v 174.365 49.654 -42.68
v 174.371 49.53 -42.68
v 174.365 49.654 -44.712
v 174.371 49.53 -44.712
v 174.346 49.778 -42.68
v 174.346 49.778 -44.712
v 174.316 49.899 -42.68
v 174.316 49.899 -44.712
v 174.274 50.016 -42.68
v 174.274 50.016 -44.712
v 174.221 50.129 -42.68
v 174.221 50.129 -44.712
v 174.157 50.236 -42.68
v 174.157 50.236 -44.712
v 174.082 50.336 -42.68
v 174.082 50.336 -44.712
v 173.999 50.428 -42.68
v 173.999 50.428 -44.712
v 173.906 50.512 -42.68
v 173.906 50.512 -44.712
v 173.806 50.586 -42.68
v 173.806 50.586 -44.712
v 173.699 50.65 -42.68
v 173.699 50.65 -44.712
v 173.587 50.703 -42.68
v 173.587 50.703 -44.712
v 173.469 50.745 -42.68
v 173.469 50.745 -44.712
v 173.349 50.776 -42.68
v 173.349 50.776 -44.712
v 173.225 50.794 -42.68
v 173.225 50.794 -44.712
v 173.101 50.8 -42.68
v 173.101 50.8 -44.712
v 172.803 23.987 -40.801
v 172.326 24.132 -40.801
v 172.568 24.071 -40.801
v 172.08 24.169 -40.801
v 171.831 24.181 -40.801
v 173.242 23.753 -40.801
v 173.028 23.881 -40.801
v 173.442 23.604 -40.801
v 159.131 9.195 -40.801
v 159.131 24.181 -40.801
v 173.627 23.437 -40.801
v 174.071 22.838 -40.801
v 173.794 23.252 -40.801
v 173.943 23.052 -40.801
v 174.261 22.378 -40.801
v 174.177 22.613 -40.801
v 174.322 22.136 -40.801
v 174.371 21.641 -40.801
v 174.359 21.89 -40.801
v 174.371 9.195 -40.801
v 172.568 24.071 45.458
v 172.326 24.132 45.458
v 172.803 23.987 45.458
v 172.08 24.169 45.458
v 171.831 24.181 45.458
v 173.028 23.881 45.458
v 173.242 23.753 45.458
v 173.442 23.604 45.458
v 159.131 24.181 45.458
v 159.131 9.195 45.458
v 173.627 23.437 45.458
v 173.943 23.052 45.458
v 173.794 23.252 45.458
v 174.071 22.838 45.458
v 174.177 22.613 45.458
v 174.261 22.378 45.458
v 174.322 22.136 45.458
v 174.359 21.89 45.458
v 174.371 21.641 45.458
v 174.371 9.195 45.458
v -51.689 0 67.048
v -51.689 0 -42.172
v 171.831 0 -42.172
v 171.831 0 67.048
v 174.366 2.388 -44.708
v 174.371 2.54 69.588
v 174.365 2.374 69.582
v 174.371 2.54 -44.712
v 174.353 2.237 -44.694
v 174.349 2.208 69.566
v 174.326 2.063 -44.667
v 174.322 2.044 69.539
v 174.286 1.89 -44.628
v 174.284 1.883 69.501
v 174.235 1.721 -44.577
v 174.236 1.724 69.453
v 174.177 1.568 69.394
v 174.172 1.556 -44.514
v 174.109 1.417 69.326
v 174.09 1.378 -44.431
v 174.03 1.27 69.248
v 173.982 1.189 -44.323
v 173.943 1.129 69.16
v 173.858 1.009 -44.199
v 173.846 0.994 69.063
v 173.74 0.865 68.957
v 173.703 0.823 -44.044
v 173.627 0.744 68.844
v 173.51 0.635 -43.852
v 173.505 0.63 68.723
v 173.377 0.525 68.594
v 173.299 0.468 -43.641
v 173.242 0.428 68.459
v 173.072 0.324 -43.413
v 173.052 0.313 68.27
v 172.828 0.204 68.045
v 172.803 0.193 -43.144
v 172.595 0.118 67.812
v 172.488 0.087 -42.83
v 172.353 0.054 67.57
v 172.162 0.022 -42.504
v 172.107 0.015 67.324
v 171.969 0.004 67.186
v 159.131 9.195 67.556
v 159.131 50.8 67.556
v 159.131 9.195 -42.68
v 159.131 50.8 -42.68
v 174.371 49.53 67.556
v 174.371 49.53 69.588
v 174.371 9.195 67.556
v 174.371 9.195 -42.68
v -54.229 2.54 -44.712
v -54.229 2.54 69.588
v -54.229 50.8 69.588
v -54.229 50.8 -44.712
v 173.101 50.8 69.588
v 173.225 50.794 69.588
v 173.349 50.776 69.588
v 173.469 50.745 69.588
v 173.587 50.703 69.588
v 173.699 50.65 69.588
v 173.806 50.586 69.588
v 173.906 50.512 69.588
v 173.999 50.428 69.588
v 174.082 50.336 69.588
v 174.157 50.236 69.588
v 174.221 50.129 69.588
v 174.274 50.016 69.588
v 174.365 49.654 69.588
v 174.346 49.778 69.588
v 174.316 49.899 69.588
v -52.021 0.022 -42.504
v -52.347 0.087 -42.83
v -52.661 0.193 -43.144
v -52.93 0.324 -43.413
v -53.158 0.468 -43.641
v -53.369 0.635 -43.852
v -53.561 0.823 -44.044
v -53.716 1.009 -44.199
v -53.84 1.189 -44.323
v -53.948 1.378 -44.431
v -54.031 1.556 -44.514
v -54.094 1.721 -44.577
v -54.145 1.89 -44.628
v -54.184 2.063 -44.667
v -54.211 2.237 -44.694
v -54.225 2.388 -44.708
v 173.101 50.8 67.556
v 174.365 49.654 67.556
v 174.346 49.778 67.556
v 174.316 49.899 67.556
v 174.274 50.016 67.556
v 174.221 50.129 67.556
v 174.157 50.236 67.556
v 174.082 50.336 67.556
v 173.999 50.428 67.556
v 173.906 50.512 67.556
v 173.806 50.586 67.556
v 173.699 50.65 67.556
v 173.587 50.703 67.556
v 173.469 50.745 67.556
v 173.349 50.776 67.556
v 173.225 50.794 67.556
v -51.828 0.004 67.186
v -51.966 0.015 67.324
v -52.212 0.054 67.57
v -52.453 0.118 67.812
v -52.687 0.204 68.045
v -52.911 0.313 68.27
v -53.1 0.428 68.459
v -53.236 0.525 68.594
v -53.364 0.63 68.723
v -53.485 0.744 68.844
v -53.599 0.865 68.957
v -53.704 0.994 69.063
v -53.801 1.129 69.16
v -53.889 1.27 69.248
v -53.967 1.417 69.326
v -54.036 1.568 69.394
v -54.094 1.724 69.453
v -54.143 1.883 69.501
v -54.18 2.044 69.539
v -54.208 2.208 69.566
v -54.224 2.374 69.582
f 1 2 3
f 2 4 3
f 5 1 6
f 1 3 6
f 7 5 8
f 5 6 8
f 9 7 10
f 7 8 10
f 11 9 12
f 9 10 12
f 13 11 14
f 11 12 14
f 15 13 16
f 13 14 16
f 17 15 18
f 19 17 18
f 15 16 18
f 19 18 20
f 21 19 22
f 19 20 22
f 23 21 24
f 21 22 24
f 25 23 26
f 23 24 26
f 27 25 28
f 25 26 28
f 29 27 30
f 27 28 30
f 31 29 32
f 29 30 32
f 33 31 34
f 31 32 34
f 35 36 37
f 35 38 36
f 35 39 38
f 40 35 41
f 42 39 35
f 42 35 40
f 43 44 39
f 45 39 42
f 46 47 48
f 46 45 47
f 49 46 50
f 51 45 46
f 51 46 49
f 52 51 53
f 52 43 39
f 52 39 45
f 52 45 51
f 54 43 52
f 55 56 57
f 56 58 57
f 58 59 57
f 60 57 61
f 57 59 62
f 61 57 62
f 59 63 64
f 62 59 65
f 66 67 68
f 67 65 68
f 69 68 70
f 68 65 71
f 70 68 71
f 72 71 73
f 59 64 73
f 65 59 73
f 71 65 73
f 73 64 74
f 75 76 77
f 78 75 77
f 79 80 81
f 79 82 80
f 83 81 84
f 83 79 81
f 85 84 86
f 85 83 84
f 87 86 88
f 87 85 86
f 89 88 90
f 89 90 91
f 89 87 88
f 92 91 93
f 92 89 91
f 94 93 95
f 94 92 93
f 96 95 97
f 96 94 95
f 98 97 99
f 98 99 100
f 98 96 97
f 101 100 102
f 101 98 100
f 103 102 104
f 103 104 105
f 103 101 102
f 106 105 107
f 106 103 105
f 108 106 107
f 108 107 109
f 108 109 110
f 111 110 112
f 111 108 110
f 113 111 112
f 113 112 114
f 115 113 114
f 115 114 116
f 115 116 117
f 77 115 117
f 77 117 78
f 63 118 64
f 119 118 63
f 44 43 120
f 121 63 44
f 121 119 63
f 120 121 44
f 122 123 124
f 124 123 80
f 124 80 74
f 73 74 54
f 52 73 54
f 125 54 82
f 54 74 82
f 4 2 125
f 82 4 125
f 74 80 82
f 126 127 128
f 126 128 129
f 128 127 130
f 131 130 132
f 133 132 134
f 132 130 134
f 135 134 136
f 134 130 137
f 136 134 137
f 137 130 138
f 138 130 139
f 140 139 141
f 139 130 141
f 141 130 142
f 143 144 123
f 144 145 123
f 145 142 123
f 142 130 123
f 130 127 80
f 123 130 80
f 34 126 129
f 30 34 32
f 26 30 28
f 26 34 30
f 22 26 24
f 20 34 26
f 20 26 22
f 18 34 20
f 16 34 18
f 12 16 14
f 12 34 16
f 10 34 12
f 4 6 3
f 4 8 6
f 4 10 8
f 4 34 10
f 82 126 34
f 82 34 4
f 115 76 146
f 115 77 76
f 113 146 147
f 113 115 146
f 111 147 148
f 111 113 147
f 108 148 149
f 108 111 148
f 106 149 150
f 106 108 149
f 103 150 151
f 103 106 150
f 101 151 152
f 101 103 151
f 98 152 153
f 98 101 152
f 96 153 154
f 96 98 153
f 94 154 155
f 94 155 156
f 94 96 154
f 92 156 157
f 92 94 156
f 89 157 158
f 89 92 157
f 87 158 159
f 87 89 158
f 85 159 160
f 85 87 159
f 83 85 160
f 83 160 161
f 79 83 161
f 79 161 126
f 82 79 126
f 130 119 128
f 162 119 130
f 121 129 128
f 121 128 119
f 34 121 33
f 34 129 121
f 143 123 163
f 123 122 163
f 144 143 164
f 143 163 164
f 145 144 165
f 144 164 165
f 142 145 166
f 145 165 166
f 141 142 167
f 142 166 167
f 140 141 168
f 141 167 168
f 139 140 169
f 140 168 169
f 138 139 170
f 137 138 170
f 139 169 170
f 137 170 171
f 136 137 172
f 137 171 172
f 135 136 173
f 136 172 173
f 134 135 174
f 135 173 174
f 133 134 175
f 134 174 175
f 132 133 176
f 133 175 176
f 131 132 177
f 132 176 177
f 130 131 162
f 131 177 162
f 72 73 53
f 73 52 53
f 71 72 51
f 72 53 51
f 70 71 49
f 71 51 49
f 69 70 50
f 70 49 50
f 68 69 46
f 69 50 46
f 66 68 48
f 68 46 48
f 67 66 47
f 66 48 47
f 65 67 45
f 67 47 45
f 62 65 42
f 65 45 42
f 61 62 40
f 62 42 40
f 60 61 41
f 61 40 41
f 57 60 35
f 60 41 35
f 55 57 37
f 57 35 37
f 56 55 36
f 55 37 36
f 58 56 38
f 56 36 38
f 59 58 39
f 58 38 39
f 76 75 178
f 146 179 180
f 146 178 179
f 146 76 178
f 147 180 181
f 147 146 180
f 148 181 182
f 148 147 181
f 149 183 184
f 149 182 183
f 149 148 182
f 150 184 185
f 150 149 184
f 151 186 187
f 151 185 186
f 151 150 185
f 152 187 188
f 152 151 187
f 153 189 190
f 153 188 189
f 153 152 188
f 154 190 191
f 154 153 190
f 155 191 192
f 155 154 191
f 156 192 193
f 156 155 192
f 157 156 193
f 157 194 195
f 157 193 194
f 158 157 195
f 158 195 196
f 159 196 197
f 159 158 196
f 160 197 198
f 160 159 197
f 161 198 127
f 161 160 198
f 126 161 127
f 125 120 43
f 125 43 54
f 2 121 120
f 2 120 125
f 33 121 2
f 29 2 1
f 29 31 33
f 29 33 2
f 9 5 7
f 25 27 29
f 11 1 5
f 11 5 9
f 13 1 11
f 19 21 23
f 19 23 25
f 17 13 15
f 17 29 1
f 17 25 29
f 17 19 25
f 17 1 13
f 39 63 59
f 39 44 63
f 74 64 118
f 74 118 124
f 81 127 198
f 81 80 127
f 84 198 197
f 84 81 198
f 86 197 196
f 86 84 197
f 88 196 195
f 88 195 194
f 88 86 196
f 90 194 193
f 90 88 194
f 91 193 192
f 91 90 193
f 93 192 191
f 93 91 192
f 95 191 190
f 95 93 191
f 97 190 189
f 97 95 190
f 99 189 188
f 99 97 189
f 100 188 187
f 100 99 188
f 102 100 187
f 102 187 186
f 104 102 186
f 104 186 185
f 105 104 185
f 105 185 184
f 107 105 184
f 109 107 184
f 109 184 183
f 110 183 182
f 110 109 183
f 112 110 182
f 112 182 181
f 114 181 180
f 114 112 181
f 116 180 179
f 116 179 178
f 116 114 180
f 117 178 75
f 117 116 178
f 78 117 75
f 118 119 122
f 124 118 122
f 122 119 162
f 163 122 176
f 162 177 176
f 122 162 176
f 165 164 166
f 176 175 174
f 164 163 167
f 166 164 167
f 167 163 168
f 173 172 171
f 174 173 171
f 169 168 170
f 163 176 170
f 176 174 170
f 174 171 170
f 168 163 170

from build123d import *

# Parameters (mm, degrees)
SKETCH1_W           = 228.6
SKETCH1_H           = 114.3
BOSS_EXTRUDE1_DEPTH = 50.8
SKETCH2_W           = 15.24
SKETCH2_H           = 110.236
CUT_EXTRUDE1_DEPTH  = 41.6052
SKETCH3_W           = 15.24
SKETCH3_H           = 86.2584
BOSS_EXTRUDE2_DEPTH = 14.986
FILLET1_R           = 2.54
FILLET2_R           = 1.27
FILLET3_R           = 2.54


with BuildPart() as part:
    # Sketch1 → Boss-Extrude1 (new body)
    with BuildSketch(Plane(origin=(0, 0, 0), x_dir=(1, 0, 0), z_dir=(0, 1, 0))):
        with Locations((60.070744159, -12.437798992)):
            Rectangle(SKETCH1_W, SKETCH1_H)
    extrude(amount=BOSS_EXTRUDE1_DEPTH)

    # Sketch2 → Cut-Extrude1 (cut)
    with BuildSketch(Plane(origin=(0, 50.8, 0), x_dir=(1, 0, 0), z_dir=(0, 1, 0))):
        with Locations((166.750744159, -12.437798992)):
            Rectangle(SKETCH2_W, SKETCH2_H)
    extrude(amount=-CUT_EXTRUDE1_DEPTH, mode=Mode.SUBTRACT)

    # Sketch3 → Boss-Extrude2 (add)
    with BuildSketch(Plane(origin=(0, 9.1948, 0), x_dir=(1, 0, 0), z_dir=(0, 1, 0))):
        with Locations((166.750744159, -2.328598992)):
            Rectangle(SKETCH3_W, SKETCH3_H)
    extrude(amount=BOSS_EXTRUDE2_DEPTH)

    # Fillet1
    fillet1_edges = [part.edges().sort_by_distance(p)[0] for p in [
        (174.370744159, 24.1808, 2.328598992),
    ]]
    fillet(fillet1_edges, radius=FILLET1_R)

    # Fillet2
    fillet2_edges = [part.edges().sort_by_distance(p)[0] for p in [
        (174.370744159, 50.8, 68.571798992),
        (174.370744159, 50.8, -43.696201008),
    ]]
    fillet(fillet2_edges, radius=FILLET2_R)

    # Fillet3
    fillet3_edges = [part.edges().sort_by_distance(p)[0] for p in [
        (60.070744159, 0, -44.712201008),
        (174.370744159, 0, 12.437798992),
        (60.070744159, 0, 69.587798992),
        (-54.229255841, 0, 12.437798992),
    ]]
    fillet(fillet3_edges, radius=FILLET3_R)


solid = part.part
